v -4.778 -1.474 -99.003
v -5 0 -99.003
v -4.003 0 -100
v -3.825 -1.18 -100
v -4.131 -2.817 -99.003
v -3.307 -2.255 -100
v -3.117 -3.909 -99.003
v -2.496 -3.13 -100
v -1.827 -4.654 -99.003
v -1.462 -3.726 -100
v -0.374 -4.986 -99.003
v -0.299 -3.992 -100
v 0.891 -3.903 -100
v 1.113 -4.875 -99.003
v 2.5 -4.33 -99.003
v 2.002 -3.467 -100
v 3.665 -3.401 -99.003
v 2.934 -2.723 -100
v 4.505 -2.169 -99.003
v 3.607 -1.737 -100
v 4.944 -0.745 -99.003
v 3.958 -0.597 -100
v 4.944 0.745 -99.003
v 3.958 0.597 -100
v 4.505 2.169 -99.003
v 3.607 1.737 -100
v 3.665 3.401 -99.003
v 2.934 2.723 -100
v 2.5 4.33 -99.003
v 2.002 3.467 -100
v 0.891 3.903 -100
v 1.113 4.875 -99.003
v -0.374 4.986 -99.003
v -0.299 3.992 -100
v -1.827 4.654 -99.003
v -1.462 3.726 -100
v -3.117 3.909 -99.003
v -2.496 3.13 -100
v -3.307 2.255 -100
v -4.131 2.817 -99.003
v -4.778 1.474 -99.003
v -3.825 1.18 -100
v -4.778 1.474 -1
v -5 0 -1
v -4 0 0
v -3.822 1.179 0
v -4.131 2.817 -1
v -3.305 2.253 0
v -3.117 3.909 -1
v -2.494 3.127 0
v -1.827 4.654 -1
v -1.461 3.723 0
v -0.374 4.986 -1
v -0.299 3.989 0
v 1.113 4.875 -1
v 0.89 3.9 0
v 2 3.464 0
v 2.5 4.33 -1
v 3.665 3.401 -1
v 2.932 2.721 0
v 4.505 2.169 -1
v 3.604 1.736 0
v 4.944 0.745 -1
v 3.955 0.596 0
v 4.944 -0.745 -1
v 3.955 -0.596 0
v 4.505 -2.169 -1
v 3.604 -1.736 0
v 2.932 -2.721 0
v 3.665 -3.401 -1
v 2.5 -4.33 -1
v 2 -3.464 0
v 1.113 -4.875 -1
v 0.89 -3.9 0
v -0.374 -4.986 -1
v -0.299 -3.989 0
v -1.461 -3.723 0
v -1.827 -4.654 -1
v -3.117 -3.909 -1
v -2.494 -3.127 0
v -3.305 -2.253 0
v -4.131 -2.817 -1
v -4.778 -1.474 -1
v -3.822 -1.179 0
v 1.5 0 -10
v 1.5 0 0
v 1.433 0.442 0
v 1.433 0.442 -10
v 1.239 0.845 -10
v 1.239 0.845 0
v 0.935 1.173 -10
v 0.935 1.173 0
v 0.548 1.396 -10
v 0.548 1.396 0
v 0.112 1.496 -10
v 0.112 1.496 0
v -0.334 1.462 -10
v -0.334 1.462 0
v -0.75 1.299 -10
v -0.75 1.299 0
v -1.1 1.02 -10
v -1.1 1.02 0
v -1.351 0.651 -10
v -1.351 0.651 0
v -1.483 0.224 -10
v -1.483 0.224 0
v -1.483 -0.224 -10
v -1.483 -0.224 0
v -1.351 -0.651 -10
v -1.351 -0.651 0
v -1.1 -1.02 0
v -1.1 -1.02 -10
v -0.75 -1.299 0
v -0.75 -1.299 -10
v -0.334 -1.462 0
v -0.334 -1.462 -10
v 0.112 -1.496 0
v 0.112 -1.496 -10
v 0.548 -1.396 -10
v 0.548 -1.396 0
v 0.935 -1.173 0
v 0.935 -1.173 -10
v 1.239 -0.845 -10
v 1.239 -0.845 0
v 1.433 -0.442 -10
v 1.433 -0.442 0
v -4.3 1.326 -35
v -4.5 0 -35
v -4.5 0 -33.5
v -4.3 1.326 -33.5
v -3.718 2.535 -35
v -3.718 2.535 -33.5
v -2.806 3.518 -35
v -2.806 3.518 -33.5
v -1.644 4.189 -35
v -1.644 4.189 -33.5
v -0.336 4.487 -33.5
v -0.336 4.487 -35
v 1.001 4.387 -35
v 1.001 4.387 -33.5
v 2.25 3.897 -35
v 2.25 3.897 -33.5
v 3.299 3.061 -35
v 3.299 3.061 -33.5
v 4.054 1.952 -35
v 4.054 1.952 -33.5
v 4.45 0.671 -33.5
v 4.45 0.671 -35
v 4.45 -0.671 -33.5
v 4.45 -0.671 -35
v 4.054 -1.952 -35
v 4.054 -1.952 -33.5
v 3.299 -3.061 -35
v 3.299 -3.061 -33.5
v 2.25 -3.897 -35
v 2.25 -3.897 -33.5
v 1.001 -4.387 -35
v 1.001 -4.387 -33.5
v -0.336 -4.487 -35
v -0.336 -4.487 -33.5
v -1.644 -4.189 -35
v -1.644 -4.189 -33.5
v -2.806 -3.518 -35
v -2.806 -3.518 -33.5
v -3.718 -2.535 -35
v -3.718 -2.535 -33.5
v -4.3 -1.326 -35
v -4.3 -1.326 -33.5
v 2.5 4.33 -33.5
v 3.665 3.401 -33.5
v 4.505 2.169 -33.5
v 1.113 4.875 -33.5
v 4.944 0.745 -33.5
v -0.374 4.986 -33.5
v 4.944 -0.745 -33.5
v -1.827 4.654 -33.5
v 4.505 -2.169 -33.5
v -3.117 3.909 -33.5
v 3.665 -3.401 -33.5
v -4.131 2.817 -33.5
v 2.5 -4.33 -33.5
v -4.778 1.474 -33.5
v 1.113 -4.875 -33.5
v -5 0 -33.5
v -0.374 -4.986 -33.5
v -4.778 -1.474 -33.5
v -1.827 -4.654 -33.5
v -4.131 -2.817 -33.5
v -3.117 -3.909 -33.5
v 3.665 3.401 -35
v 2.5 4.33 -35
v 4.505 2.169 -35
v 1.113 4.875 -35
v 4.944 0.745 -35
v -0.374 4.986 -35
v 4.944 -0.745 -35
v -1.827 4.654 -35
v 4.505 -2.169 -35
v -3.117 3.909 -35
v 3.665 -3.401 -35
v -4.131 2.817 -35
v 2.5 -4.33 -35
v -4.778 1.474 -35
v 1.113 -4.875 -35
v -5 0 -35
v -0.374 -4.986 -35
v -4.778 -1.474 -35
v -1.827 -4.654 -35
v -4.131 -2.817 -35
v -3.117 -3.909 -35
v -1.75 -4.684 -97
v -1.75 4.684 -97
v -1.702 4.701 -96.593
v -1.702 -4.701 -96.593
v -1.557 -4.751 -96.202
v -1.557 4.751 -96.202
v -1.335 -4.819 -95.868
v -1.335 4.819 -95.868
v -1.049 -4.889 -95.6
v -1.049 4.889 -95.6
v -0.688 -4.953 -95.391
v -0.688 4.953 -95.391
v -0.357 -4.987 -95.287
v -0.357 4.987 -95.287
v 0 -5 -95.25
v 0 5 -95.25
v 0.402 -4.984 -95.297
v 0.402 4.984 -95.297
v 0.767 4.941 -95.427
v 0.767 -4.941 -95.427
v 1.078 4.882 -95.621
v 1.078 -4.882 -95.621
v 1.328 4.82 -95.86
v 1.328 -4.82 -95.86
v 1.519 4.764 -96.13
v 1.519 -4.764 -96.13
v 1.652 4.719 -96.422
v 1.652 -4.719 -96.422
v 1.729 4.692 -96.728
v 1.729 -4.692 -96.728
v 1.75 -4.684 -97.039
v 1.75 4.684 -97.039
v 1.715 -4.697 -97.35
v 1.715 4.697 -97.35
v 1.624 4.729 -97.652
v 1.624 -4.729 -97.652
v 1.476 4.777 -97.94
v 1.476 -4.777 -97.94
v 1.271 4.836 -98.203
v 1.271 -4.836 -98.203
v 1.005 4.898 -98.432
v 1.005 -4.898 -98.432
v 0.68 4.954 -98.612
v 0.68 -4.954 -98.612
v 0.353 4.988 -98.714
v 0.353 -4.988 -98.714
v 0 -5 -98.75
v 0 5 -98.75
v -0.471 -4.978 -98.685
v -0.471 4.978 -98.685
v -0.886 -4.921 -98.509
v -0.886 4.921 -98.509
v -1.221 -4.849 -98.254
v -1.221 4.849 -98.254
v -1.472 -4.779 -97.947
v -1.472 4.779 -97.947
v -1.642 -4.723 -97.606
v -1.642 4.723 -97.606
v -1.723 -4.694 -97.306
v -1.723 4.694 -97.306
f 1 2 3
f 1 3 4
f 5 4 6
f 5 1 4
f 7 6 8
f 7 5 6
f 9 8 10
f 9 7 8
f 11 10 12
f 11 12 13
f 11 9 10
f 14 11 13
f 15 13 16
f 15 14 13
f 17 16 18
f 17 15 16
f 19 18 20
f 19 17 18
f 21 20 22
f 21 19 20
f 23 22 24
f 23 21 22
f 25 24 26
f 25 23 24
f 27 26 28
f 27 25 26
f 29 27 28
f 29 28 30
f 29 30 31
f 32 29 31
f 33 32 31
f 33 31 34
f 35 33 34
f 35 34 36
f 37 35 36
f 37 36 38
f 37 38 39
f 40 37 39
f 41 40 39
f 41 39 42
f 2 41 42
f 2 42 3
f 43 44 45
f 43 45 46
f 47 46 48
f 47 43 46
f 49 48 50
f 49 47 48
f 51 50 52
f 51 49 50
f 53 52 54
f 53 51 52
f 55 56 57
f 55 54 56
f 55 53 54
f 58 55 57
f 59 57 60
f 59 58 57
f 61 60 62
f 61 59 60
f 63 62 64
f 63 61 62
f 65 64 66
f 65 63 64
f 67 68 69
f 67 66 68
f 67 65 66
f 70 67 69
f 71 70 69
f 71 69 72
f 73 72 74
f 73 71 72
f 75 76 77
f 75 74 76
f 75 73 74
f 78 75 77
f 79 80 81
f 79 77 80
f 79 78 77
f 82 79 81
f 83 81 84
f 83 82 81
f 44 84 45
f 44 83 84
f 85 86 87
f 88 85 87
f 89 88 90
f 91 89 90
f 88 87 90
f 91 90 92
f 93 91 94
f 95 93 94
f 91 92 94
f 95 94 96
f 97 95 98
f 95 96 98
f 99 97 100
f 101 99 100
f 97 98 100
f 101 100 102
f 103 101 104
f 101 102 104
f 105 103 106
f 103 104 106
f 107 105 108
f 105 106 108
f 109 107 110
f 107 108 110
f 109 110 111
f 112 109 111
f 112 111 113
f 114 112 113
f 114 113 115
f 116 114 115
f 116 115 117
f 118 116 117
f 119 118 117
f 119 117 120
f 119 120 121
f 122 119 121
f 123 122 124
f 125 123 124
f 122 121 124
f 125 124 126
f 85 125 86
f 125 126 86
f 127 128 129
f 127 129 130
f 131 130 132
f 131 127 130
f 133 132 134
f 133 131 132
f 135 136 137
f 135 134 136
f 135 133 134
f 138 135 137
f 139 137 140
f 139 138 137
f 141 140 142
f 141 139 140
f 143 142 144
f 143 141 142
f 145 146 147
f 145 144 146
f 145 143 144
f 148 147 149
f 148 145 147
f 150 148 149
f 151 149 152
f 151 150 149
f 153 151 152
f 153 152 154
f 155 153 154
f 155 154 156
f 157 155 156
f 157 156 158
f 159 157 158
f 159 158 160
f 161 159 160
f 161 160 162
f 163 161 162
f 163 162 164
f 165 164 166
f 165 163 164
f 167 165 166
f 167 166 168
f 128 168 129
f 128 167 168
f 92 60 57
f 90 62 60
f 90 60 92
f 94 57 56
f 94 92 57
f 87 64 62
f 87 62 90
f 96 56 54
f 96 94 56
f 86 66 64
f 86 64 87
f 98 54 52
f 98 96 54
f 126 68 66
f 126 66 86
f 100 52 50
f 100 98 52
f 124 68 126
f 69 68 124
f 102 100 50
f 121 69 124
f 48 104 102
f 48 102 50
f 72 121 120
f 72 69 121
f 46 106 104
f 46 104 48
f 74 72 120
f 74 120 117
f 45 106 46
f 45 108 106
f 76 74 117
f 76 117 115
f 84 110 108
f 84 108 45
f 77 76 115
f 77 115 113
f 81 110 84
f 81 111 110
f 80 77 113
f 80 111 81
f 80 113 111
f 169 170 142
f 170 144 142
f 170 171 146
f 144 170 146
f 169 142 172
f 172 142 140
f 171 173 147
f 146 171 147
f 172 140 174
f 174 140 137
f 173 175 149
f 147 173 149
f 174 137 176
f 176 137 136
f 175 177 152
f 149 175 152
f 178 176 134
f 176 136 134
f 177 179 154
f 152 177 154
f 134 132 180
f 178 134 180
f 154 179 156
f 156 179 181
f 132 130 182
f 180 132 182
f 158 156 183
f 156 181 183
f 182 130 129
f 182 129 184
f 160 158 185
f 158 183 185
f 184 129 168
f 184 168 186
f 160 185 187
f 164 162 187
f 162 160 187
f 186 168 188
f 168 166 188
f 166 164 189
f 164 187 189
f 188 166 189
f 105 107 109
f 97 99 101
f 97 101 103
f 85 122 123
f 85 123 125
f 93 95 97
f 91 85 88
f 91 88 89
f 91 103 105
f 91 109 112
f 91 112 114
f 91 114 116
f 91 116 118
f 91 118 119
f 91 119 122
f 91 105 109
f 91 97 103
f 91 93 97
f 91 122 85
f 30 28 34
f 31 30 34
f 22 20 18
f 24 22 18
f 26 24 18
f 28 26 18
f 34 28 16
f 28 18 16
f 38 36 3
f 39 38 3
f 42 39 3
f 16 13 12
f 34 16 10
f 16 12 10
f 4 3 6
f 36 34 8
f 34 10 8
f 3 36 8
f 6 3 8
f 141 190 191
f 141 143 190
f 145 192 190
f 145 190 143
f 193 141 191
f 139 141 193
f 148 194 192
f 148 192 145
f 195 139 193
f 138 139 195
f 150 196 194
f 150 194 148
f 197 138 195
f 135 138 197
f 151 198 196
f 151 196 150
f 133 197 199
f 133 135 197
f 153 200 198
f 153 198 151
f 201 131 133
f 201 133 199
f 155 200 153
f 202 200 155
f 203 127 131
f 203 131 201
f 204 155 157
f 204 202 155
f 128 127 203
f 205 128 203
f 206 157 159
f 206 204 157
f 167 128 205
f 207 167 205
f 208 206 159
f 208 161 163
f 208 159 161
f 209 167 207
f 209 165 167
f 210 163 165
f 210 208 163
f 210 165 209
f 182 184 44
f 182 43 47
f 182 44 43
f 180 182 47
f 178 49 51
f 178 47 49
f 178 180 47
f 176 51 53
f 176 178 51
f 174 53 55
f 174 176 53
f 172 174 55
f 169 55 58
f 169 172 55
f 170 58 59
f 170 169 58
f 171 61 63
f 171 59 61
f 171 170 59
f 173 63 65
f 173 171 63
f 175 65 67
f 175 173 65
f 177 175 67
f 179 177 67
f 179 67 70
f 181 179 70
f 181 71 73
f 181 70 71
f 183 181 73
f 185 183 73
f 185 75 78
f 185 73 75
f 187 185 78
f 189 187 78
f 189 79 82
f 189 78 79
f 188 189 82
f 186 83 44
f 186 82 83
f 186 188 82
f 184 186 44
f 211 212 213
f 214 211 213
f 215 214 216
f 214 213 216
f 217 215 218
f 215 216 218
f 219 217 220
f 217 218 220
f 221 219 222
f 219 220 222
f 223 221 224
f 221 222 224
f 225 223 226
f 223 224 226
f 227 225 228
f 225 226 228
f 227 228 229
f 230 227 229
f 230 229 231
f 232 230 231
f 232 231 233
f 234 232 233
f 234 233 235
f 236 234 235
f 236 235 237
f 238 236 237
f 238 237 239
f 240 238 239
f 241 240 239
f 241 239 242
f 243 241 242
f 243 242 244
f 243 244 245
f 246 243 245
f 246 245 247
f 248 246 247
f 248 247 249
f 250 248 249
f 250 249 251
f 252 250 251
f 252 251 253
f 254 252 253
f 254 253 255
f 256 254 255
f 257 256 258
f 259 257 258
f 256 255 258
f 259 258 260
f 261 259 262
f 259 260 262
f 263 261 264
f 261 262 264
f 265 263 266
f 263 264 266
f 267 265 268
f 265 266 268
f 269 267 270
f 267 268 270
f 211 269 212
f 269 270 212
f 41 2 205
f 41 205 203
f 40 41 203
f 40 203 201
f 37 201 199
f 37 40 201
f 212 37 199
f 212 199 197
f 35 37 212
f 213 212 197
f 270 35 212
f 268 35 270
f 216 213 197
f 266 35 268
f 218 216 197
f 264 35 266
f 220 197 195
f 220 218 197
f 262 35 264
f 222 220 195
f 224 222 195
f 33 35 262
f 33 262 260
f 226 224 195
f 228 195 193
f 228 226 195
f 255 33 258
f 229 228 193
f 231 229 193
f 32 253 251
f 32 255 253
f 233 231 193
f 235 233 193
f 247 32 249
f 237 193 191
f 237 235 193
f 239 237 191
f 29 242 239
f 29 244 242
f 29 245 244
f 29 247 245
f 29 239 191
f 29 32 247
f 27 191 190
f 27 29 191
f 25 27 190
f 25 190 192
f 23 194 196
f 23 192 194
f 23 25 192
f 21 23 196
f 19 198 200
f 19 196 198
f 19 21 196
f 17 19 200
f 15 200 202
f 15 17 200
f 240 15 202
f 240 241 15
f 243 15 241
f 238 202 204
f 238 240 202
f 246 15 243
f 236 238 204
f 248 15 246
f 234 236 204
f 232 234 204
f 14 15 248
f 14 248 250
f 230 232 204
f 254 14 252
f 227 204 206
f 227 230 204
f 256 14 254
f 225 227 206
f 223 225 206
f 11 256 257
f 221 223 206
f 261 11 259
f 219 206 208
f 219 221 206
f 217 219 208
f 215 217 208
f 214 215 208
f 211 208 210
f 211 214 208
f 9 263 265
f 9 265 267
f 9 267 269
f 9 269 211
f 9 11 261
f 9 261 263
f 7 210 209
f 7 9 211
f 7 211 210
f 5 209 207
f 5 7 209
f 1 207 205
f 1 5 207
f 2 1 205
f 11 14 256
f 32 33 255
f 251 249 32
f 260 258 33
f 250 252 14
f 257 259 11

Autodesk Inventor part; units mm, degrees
ref_plane "YZ Plane" through (0, 0, 0) normal (1, 0, 0) x (0, 1, 0)
ref_plane "XY Plane" through (0, 0, 0) normal (0, 0, 1) x (1, 0, 0)
sketch "Sketch1" plane through (0, 0, 0) normal (0, 1, 0) x (-1, 0, 0)
  line L0 (0, 0) -> (5, 0)
  line L1 (5, 0) -> (5, -100)
  line L2 (5, -100) -> (0, -100)
  line L3 (0, -100) -> (0, 0)
  line L4 (5, -33.5) -> (4.5, -33.5)
  line L5 (4.5, -33.5) -> (4.5, -35)
  line L6 (4.5, -35) -> (5, -35)
  line L7 (5, -35) -> (5, -33.5)
  line L8 (5, -90) -> (0, -90) construction
  line L9 (5, -99.003) -> (4.003, -100)
  line L10 (4, 0) -> (5, -1)
  dimension "d0" = 5
  dimension "d1" = 100
  dimension "d2" = 1.5
  dimension "d3" = 0.5
  dimension "d4" = 135
  dimension "d5" = 10
  dimension "d6" = 55
  dimension "d7" = 1.41
  dimension "d8" = 45
  dimension "d9" = 1.4142
revolve "Revolution1" add sketch "Sketch1" angle 360 about axis through (0, 0, -100) along (0, 0, 1) contours L0 L10 L1 L4 L5 L6 L9 L2 L3
ref_plane "Work Plane1" through (0, 5, -67.0015) normal (0, 1, 0) x (-1, 0, 0)
sketch "Sketch2" plane through (0, 5, -67.0015) normal (0, 1, 0) x (-1, 0, 0)
  circle A0 centre (0, -29.9985) radius 1.75
  line L0 (-4.003, -32.9985) -> (4.003, -32.9985) projected
  point P0 (0, 67.0015)
  dimension "d11" = 3.5
  dimension "d12" = 3
extrude "Extrusion1" cut sketch "Sketch2" against normal blind 10
sketch "Sketch3" plane through (0, 0, 0) normal (0, 0, 1) x (1, 0, 0)
  circle A0 centre (0, 0) radius 1.5
  dimension "d15" = 3
extrude "Extrusion2" cut sketch "Sketch3" against normal blind 10
thread "Thread1" size "M3x0.5" class "6H" standard "ANSI Metric M Profile" length 10
properties part number "10mmPins"
